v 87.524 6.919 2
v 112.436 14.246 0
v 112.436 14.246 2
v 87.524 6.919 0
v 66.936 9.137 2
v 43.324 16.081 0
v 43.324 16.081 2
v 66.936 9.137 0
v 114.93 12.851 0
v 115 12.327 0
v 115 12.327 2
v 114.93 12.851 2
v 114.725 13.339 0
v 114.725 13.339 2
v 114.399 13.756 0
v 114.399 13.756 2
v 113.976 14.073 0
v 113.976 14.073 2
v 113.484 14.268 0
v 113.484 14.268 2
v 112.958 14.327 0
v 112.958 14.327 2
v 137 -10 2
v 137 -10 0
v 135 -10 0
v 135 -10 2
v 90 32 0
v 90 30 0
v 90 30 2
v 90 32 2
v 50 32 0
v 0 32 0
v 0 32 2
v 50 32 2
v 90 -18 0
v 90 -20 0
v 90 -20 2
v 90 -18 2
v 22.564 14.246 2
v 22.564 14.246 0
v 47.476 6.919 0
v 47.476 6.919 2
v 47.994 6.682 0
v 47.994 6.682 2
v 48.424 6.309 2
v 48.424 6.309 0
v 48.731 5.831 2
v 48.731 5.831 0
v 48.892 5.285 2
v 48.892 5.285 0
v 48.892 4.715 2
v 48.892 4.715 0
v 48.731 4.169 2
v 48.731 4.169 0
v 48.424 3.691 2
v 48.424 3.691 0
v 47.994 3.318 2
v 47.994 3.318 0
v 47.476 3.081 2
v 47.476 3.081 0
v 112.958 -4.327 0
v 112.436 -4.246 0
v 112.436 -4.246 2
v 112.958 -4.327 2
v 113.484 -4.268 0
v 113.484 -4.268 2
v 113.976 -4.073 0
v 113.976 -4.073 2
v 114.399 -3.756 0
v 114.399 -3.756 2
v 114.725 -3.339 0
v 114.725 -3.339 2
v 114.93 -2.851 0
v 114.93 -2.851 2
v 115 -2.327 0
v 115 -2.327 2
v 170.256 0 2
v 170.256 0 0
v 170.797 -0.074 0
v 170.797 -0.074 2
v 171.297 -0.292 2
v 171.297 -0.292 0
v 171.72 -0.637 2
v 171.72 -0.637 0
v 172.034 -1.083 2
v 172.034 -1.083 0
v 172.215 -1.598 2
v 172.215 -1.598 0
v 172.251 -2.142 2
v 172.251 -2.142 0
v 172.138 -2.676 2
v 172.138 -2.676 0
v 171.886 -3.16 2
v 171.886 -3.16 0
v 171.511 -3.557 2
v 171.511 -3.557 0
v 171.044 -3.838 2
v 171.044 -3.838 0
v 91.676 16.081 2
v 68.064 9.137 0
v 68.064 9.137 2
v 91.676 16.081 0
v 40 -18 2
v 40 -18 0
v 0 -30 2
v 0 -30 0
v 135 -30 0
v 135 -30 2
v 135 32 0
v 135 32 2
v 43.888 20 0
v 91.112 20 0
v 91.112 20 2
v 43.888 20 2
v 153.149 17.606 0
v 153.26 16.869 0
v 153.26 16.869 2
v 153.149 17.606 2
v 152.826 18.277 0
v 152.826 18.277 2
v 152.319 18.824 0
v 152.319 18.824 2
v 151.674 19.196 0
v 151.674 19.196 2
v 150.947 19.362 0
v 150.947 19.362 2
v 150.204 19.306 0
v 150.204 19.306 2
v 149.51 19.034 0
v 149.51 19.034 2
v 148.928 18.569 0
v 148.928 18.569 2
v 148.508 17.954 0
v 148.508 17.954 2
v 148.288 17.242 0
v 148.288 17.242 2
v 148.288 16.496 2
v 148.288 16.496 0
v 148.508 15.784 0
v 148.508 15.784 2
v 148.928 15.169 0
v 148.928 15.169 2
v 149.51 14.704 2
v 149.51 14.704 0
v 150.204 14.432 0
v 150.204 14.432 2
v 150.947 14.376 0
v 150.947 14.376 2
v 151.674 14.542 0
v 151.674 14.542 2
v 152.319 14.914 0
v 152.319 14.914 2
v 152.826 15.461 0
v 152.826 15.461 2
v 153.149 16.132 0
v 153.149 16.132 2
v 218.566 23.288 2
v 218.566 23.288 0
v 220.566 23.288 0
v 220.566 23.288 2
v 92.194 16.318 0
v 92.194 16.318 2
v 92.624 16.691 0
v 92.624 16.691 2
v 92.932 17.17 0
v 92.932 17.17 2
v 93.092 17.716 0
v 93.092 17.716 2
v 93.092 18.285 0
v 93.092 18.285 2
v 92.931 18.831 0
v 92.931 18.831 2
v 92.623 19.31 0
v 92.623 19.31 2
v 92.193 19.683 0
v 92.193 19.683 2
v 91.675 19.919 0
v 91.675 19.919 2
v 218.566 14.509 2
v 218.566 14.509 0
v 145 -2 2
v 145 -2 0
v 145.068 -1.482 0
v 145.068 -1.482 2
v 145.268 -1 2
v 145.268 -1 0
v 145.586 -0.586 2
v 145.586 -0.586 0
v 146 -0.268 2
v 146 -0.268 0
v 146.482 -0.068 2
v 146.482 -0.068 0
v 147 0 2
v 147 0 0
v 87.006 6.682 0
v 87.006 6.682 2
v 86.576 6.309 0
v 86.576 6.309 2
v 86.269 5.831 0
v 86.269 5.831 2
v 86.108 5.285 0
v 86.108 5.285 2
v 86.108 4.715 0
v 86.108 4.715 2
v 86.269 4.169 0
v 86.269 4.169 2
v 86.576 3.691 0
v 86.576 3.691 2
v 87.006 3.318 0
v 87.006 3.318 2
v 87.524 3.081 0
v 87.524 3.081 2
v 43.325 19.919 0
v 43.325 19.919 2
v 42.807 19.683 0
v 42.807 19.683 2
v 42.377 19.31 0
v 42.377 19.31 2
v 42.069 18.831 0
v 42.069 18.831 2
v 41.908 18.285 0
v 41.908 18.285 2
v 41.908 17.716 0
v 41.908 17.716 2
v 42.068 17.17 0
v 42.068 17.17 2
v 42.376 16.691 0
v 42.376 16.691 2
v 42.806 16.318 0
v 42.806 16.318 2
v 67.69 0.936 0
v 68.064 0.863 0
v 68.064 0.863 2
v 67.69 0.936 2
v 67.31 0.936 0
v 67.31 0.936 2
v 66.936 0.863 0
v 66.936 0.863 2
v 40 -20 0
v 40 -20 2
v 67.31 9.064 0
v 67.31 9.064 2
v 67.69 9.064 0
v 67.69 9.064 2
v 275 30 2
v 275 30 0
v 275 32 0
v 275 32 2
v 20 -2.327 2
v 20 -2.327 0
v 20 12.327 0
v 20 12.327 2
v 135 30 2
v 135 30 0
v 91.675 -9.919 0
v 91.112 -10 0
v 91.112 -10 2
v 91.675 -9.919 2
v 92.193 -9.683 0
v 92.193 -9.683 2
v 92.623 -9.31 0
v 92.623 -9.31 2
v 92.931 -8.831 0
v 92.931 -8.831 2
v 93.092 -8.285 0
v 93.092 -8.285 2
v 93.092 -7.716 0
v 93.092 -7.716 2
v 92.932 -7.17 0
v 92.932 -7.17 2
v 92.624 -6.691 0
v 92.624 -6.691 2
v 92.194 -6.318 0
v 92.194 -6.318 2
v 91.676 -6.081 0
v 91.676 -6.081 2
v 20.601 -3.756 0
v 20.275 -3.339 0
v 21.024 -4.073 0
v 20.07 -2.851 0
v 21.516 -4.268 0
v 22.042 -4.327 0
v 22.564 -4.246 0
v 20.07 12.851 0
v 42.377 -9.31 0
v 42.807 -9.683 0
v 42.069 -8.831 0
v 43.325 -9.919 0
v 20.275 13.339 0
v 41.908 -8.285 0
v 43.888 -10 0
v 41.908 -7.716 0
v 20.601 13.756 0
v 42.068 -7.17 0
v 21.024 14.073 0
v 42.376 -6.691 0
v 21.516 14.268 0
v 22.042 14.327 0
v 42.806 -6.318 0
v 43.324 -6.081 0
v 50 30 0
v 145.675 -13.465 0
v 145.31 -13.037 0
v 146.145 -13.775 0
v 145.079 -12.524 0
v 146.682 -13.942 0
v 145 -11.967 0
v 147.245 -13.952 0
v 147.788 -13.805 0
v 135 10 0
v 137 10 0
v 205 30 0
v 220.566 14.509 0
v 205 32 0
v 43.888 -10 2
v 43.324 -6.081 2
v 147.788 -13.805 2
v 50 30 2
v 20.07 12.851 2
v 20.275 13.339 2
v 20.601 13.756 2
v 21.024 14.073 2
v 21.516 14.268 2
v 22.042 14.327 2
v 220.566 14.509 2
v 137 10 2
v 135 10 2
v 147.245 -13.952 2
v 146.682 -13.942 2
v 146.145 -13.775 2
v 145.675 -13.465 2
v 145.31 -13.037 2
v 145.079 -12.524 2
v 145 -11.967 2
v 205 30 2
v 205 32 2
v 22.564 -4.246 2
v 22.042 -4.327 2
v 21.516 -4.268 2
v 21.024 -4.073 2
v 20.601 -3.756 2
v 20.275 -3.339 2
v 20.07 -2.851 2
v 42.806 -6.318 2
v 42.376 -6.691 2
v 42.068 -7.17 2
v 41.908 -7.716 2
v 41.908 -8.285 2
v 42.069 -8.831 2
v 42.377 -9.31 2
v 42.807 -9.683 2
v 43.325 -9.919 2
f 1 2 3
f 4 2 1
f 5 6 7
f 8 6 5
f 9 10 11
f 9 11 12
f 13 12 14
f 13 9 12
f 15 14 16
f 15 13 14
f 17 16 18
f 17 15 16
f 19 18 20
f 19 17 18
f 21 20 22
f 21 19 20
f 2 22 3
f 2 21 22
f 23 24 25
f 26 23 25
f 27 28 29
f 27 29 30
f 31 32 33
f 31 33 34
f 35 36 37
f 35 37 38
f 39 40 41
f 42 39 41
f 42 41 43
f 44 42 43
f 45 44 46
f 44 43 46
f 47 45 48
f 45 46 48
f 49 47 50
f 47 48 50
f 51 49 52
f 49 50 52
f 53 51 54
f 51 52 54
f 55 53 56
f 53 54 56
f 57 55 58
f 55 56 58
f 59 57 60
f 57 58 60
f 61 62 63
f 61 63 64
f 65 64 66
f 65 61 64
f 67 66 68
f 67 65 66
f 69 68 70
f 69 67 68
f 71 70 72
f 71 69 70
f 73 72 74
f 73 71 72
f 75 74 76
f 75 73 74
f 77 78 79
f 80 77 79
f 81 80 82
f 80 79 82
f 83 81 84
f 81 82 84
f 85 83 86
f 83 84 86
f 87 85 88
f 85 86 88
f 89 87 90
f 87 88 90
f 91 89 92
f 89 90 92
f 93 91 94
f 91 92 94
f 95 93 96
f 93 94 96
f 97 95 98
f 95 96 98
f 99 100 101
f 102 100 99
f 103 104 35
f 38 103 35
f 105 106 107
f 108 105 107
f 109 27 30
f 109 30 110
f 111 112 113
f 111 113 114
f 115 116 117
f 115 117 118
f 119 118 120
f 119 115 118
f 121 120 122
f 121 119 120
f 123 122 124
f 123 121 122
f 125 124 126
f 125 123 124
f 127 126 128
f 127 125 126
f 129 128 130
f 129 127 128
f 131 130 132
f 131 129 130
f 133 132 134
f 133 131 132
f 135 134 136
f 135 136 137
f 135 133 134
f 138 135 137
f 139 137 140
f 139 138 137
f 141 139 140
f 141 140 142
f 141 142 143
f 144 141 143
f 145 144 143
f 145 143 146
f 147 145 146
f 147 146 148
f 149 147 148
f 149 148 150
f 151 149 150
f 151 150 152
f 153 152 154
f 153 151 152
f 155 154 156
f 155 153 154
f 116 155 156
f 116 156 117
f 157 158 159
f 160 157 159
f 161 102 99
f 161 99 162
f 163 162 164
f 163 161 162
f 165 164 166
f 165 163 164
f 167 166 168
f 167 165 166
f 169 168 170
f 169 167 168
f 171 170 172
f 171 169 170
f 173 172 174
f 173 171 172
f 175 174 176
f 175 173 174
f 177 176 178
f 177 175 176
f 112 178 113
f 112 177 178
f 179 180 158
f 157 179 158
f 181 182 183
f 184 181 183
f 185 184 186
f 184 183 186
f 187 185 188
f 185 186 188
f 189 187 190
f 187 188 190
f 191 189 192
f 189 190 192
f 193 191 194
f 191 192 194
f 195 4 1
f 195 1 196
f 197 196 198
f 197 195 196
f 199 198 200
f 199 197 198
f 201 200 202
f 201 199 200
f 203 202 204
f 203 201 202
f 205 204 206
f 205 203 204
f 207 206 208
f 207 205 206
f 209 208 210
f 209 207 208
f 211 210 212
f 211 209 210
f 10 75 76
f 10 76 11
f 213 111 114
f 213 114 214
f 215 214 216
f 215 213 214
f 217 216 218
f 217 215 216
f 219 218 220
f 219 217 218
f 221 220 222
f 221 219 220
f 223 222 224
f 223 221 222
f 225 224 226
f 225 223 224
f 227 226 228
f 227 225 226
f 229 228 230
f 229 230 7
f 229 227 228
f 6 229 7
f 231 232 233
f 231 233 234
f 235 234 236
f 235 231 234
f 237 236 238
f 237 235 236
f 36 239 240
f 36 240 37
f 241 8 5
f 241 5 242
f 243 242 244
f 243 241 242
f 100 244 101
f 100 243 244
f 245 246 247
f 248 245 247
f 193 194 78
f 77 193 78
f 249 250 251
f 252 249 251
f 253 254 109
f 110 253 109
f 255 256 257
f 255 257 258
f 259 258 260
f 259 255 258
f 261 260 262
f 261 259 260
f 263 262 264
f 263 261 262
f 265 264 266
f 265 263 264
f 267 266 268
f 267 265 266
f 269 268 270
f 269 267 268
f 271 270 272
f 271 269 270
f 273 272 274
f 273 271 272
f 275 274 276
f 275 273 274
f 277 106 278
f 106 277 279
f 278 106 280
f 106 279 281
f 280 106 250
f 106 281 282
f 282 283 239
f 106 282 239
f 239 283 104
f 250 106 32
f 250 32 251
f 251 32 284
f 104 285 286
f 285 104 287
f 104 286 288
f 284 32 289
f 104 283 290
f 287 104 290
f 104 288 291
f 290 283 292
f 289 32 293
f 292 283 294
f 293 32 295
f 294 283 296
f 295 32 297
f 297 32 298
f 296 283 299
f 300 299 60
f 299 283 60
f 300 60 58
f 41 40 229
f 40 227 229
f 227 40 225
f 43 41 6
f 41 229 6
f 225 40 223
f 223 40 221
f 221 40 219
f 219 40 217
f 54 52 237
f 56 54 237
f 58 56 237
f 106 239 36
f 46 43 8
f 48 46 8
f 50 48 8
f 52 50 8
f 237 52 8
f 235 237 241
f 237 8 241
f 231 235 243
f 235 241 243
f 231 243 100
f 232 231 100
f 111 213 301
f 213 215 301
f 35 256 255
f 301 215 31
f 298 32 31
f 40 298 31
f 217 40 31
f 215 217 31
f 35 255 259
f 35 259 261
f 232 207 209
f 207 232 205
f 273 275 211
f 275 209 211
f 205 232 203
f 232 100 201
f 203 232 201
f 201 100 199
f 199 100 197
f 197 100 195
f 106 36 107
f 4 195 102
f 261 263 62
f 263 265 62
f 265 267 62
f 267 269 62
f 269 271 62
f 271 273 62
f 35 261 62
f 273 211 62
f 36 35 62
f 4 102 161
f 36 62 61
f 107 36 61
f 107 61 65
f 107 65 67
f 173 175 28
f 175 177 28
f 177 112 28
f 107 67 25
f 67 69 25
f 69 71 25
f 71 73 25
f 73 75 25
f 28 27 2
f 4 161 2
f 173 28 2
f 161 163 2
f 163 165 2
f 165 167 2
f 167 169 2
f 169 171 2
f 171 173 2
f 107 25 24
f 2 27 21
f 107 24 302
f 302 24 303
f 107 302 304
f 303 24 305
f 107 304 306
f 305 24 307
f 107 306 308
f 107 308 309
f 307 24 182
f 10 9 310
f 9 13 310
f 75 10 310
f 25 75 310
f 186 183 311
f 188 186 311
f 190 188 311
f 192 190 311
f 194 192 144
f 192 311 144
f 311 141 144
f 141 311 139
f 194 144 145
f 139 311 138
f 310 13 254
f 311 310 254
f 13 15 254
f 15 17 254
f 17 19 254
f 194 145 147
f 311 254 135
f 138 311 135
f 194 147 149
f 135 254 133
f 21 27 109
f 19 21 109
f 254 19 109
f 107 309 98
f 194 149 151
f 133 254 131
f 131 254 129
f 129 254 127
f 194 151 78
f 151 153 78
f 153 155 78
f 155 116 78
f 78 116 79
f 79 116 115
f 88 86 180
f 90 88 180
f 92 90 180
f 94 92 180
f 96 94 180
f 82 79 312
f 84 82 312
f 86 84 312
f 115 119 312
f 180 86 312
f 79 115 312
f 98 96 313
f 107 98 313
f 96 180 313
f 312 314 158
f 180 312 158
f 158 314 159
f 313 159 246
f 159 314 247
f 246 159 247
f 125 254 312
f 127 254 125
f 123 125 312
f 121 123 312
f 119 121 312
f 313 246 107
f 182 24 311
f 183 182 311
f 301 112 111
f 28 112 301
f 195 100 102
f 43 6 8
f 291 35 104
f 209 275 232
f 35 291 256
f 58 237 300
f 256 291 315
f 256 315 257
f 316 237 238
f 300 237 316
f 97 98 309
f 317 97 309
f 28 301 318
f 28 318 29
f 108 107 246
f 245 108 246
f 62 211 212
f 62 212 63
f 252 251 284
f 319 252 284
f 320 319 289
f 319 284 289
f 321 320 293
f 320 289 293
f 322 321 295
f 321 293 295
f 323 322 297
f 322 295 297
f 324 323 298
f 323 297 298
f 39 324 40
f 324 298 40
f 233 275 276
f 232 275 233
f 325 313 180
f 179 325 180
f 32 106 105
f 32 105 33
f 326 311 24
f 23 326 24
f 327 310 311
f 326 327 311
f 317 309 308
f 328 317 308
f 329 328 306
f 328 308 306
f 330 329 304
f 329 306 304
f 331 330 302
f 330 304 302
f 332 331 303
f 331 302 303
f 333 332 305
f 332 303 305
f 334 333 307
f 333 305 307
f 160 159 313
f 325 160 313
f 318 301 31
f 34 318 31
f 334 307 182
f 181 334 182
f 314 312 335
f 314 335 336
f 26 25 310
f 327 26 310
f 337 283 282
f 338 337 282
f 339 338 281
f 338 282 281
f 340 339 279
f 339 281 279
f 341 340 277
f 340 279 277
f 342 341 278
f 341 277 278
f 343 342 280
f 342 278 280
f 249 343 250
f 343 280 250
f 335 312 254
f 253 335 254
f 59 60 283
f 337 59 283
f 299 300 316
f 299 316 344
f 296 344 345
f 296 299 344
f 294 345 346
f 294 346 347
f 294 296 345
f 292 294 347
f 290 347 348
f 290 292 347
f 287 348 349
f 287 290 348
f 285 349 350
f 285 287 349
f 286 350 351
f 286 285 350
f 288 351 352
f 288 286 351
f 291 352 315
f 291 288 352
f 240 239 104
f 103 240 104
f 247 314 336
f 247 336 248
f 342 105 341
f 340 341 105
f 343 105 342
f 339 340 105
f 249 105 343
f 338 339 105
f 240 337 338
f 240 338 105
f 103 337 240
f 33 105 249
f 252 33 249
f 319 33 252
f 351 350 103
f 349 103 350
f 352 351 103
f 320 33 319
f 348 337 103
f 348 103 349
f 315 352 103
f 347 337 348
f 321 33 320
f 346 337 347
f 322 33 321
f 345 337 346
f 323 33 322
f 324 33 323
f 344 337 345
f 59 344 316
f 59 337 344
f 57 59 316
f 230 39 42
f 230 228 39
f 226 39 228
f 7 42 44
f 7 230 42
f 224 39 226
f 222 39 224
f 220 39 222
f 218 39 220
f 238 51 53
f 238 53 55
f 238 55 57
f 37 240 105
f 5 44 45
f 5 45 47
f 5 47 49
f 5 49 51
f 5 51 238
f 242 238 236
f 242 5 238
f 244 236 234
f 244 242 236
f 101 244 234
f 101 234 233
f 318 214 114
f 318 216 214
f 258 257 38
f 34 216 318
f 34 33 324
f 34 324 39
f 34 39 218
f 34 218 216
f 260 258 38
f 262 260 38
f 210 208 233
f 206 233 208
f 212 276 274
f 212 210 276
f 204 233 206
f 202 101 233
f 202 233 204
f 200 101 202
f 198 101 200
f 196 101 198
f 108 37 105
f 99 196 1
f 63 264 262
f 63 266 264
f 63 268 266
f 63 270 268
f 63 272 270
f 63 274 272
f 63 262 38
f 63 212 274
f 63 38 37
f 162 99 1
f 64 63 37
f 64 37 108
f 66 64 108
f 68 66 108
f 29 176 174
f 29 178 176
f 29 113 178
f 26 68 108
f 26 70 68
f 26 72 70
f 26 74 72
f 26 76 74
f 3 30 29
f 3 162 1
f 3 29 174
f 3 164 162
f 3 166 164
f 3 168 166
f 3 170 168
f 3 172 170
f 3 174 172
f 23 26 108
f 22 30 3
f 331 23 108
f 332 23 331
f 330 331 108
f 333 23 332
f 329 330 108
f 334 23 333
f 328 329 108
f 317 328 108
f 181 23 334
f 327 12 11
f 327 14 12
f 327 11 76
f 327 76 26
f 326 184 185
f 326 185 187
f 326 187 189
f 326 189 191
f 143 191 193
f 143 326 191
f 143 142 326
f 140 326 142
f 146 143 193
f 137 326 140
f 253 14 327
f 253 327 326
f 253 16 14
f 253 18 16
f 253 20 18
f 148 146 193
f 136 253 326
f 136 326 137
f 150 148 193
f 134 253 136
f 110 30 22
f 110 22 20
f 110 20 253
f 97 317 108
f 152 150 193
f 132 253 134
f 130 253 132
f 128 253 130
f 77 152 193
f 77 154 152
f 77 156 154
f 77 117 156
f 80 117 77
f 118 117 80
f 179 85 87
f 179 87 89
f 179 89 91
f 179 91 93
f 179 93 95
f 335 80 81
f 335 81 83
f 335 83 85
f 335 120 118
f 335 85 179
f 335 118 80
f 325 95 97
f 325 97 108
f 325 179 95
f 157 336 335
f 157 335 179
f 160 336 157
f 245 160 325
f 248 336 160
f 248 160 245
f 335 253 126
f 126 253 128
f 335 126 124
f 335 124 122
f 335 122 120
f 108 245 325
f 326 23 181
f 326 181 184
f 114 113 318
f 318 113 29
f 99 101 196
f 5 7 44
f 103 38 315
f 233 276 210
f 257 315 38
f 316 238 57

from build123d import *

# Parameters (mm, degrees)
SKETCH_1_W      = 135
SKETCH_1_H      = 60.000000048
SKETCH_1_W_2    = 50
SKETCH_1_H_2    = 2
SKETCH_1_R      = 2.5
SKETCH_1_W_3    = 45
SKETCH_1_H_3    = 2.000000262
SKETCH_1_W_4    = 70.000000056
EXTRUDE_1_DEPTH = 2


with BuildPart() as part:
    # 草图1 → 凸台-拉伸1 (new body)
    # profile 1 of 5: a face of its own
    with BuildSketch(Plane.XY):
        with Locations((67.5, -2.86e-07)):
            Rectangle(SKETCH_1_W, SKETCH_1_H)
        with BuildLine():
            ThreePointArc((68.064332648, 0.863431574), (67.5, 0.944700571), (66.935667352, 0.863431574))
            Line((66.935667352, 0.863431574), (43.323685411, -6.081268997))
            ThreePointArc((43.323685411, -6.081268997), (41.908439567, -8.285077177), (43.888018059, -10))
            Line((43.888018059, -10), (91.111981941, -10))
            ThreePointArc((91.111981941, -10), (93.091560433, -8.285077177), (91.676314589, -6.081268997))
            Line((91.676314589, -6.081268997), (68.064332648, 0.863431574))
        make_face(mode=Mode.SUBTRACT)
        with BuildLine():
            ThreePointArc((66.935667352, 9.136568426), (67.5, 9.055299429), (68.064332648, 9.136568426))
            Line((68.064332648, 9.136568426), (91.676314589, 16.081268997))
            ThreePointArc((91.676314589, 16.081268997), (93.091560433, 18.285077177), (91.111981941, 20))
            Line((91.111981941, 20), (43.888018059, 20))
            ThreePointArc((43.888018059, 20), (41.908439567, 18.285077177), (43.323685411, 16.081268997))
            Line((43.323685411, 16.081268997), (66.935667352, 9.136568426))
        make_face(mode=Mode.SUBTRACT)
        with Locations((65, -19)):
            Rectangle(SKETCH_1_W_2, SKETCH_1_H_2, mode=Mode.SUBTRACT)
        with BuildLine():
            Line((47.476314589, 3.081268997), (22.564332648, -4.245784515))
            ThreePointArc((22.564332648, -4.245784515), (20.80180663, -3.928406892), (20, -2.327053512))
            Line((20, -2.327053512), (20, 12.327053512))
            ThreePointArc((20, 12.327053512), (20.80180663, 13.928406892), (22.564332648, 14.245784515))
            Line((22.564332648, 14.245784515), (47.476314589, 6.918731003))
            ThreePointArc((47.476314589, 6.918731003), (48.911981941, 5), (47.476314589, 3.081268997))
        make_face(mode=Mode.SUBTRACT)
        with BuildLine():
            Line((87.523685411, 3.081268997), (112.435667352, -4.245784515))
            ThreePointArc((112.435667352, -4.245784515), (114.19819337, -3.928406892), (115, -2.327053512))
            Line((115, -2.327053512), (115, 12.327053512))
            ThreePointArc((115, 12.327053512), (114.19819337, 13.928406892), (112.435667352, 14.245784515))
            Line((112.435667352, 14.245784515), (87.523685411, 6.918731003))
            ThreePointArc((87.523685411, 6.918731003), (86.088018059, 5), (87.523685411, 3.081268997))
        make_face(mode=Mode.SUBTRACT)
    # profile 2 of 5: a face of its own
    with BuildSketch(Plane.XY):
        Polygon((135, -10), (135, -30.00000031), (275.000000112, 29.999999738), (205.000000056, 29.999999738), (135, 29.999999738), (135, 10), (137, 10), (137, -10), align=None)
        with BuildLine():
            Line((171.04398986, -3.83829006), (147.787838597, -13.80521203))
            ThreePointArc((147.787838597, -13.80521203), (145.899017983, -13.636604154), (145, -11.96692197))
            Line((145, -11.96692197), (145, -2))
            ThreePointArc((145, -2), (145.585786438, -0.585786438), (147, 0))
            Line((147, 0), (170.256151263, 0))
            ThreePointArc((170.256151263, 0), (172.215306708, -1.597868255), (171.04398986, -3.83829006))
        make_face(mode=Mode.SUBTRACT)
        with Locations((150.760493498, 16.868933163)):
            Circle(SKETCH_1_R, mode=Mode.SUBTRACT)
        Polygon((218.565739708, 14.508933163), (218.565739708, 16.868933163), (218.565739708, 23.287933163), (220.565739708, 23.287933163), (220.565739708, 14.508933163), align=None, mode=Mode.SUBTRACT)
    # profile 3 of 5: a face of its own
    with BuildSketch(Plane.XY):
        with Locations((112.5, 30.999999869)):
            Rectangle(SKETCH_1_W_3, SKETCH_1_H_3)
    # profile 4 of 5: a face of its own
    with BuildSketch(Plane.XY):
        with Locations((25, 30.999999869)):
            Rectangle(SKETCH_1_W_2, SKETCH_1_H_3)
    # profile 5 of 5: a face of its own
    with BuildSketch(Plane.XY):
        with Locations((240.000000084, 30.999999869)):
            Rectangle(SKETCH_1_W_4, SKETCH_1_H_3)
    extrude(amount=EXTRUDE_1_DEPTH)


solid = part.part
